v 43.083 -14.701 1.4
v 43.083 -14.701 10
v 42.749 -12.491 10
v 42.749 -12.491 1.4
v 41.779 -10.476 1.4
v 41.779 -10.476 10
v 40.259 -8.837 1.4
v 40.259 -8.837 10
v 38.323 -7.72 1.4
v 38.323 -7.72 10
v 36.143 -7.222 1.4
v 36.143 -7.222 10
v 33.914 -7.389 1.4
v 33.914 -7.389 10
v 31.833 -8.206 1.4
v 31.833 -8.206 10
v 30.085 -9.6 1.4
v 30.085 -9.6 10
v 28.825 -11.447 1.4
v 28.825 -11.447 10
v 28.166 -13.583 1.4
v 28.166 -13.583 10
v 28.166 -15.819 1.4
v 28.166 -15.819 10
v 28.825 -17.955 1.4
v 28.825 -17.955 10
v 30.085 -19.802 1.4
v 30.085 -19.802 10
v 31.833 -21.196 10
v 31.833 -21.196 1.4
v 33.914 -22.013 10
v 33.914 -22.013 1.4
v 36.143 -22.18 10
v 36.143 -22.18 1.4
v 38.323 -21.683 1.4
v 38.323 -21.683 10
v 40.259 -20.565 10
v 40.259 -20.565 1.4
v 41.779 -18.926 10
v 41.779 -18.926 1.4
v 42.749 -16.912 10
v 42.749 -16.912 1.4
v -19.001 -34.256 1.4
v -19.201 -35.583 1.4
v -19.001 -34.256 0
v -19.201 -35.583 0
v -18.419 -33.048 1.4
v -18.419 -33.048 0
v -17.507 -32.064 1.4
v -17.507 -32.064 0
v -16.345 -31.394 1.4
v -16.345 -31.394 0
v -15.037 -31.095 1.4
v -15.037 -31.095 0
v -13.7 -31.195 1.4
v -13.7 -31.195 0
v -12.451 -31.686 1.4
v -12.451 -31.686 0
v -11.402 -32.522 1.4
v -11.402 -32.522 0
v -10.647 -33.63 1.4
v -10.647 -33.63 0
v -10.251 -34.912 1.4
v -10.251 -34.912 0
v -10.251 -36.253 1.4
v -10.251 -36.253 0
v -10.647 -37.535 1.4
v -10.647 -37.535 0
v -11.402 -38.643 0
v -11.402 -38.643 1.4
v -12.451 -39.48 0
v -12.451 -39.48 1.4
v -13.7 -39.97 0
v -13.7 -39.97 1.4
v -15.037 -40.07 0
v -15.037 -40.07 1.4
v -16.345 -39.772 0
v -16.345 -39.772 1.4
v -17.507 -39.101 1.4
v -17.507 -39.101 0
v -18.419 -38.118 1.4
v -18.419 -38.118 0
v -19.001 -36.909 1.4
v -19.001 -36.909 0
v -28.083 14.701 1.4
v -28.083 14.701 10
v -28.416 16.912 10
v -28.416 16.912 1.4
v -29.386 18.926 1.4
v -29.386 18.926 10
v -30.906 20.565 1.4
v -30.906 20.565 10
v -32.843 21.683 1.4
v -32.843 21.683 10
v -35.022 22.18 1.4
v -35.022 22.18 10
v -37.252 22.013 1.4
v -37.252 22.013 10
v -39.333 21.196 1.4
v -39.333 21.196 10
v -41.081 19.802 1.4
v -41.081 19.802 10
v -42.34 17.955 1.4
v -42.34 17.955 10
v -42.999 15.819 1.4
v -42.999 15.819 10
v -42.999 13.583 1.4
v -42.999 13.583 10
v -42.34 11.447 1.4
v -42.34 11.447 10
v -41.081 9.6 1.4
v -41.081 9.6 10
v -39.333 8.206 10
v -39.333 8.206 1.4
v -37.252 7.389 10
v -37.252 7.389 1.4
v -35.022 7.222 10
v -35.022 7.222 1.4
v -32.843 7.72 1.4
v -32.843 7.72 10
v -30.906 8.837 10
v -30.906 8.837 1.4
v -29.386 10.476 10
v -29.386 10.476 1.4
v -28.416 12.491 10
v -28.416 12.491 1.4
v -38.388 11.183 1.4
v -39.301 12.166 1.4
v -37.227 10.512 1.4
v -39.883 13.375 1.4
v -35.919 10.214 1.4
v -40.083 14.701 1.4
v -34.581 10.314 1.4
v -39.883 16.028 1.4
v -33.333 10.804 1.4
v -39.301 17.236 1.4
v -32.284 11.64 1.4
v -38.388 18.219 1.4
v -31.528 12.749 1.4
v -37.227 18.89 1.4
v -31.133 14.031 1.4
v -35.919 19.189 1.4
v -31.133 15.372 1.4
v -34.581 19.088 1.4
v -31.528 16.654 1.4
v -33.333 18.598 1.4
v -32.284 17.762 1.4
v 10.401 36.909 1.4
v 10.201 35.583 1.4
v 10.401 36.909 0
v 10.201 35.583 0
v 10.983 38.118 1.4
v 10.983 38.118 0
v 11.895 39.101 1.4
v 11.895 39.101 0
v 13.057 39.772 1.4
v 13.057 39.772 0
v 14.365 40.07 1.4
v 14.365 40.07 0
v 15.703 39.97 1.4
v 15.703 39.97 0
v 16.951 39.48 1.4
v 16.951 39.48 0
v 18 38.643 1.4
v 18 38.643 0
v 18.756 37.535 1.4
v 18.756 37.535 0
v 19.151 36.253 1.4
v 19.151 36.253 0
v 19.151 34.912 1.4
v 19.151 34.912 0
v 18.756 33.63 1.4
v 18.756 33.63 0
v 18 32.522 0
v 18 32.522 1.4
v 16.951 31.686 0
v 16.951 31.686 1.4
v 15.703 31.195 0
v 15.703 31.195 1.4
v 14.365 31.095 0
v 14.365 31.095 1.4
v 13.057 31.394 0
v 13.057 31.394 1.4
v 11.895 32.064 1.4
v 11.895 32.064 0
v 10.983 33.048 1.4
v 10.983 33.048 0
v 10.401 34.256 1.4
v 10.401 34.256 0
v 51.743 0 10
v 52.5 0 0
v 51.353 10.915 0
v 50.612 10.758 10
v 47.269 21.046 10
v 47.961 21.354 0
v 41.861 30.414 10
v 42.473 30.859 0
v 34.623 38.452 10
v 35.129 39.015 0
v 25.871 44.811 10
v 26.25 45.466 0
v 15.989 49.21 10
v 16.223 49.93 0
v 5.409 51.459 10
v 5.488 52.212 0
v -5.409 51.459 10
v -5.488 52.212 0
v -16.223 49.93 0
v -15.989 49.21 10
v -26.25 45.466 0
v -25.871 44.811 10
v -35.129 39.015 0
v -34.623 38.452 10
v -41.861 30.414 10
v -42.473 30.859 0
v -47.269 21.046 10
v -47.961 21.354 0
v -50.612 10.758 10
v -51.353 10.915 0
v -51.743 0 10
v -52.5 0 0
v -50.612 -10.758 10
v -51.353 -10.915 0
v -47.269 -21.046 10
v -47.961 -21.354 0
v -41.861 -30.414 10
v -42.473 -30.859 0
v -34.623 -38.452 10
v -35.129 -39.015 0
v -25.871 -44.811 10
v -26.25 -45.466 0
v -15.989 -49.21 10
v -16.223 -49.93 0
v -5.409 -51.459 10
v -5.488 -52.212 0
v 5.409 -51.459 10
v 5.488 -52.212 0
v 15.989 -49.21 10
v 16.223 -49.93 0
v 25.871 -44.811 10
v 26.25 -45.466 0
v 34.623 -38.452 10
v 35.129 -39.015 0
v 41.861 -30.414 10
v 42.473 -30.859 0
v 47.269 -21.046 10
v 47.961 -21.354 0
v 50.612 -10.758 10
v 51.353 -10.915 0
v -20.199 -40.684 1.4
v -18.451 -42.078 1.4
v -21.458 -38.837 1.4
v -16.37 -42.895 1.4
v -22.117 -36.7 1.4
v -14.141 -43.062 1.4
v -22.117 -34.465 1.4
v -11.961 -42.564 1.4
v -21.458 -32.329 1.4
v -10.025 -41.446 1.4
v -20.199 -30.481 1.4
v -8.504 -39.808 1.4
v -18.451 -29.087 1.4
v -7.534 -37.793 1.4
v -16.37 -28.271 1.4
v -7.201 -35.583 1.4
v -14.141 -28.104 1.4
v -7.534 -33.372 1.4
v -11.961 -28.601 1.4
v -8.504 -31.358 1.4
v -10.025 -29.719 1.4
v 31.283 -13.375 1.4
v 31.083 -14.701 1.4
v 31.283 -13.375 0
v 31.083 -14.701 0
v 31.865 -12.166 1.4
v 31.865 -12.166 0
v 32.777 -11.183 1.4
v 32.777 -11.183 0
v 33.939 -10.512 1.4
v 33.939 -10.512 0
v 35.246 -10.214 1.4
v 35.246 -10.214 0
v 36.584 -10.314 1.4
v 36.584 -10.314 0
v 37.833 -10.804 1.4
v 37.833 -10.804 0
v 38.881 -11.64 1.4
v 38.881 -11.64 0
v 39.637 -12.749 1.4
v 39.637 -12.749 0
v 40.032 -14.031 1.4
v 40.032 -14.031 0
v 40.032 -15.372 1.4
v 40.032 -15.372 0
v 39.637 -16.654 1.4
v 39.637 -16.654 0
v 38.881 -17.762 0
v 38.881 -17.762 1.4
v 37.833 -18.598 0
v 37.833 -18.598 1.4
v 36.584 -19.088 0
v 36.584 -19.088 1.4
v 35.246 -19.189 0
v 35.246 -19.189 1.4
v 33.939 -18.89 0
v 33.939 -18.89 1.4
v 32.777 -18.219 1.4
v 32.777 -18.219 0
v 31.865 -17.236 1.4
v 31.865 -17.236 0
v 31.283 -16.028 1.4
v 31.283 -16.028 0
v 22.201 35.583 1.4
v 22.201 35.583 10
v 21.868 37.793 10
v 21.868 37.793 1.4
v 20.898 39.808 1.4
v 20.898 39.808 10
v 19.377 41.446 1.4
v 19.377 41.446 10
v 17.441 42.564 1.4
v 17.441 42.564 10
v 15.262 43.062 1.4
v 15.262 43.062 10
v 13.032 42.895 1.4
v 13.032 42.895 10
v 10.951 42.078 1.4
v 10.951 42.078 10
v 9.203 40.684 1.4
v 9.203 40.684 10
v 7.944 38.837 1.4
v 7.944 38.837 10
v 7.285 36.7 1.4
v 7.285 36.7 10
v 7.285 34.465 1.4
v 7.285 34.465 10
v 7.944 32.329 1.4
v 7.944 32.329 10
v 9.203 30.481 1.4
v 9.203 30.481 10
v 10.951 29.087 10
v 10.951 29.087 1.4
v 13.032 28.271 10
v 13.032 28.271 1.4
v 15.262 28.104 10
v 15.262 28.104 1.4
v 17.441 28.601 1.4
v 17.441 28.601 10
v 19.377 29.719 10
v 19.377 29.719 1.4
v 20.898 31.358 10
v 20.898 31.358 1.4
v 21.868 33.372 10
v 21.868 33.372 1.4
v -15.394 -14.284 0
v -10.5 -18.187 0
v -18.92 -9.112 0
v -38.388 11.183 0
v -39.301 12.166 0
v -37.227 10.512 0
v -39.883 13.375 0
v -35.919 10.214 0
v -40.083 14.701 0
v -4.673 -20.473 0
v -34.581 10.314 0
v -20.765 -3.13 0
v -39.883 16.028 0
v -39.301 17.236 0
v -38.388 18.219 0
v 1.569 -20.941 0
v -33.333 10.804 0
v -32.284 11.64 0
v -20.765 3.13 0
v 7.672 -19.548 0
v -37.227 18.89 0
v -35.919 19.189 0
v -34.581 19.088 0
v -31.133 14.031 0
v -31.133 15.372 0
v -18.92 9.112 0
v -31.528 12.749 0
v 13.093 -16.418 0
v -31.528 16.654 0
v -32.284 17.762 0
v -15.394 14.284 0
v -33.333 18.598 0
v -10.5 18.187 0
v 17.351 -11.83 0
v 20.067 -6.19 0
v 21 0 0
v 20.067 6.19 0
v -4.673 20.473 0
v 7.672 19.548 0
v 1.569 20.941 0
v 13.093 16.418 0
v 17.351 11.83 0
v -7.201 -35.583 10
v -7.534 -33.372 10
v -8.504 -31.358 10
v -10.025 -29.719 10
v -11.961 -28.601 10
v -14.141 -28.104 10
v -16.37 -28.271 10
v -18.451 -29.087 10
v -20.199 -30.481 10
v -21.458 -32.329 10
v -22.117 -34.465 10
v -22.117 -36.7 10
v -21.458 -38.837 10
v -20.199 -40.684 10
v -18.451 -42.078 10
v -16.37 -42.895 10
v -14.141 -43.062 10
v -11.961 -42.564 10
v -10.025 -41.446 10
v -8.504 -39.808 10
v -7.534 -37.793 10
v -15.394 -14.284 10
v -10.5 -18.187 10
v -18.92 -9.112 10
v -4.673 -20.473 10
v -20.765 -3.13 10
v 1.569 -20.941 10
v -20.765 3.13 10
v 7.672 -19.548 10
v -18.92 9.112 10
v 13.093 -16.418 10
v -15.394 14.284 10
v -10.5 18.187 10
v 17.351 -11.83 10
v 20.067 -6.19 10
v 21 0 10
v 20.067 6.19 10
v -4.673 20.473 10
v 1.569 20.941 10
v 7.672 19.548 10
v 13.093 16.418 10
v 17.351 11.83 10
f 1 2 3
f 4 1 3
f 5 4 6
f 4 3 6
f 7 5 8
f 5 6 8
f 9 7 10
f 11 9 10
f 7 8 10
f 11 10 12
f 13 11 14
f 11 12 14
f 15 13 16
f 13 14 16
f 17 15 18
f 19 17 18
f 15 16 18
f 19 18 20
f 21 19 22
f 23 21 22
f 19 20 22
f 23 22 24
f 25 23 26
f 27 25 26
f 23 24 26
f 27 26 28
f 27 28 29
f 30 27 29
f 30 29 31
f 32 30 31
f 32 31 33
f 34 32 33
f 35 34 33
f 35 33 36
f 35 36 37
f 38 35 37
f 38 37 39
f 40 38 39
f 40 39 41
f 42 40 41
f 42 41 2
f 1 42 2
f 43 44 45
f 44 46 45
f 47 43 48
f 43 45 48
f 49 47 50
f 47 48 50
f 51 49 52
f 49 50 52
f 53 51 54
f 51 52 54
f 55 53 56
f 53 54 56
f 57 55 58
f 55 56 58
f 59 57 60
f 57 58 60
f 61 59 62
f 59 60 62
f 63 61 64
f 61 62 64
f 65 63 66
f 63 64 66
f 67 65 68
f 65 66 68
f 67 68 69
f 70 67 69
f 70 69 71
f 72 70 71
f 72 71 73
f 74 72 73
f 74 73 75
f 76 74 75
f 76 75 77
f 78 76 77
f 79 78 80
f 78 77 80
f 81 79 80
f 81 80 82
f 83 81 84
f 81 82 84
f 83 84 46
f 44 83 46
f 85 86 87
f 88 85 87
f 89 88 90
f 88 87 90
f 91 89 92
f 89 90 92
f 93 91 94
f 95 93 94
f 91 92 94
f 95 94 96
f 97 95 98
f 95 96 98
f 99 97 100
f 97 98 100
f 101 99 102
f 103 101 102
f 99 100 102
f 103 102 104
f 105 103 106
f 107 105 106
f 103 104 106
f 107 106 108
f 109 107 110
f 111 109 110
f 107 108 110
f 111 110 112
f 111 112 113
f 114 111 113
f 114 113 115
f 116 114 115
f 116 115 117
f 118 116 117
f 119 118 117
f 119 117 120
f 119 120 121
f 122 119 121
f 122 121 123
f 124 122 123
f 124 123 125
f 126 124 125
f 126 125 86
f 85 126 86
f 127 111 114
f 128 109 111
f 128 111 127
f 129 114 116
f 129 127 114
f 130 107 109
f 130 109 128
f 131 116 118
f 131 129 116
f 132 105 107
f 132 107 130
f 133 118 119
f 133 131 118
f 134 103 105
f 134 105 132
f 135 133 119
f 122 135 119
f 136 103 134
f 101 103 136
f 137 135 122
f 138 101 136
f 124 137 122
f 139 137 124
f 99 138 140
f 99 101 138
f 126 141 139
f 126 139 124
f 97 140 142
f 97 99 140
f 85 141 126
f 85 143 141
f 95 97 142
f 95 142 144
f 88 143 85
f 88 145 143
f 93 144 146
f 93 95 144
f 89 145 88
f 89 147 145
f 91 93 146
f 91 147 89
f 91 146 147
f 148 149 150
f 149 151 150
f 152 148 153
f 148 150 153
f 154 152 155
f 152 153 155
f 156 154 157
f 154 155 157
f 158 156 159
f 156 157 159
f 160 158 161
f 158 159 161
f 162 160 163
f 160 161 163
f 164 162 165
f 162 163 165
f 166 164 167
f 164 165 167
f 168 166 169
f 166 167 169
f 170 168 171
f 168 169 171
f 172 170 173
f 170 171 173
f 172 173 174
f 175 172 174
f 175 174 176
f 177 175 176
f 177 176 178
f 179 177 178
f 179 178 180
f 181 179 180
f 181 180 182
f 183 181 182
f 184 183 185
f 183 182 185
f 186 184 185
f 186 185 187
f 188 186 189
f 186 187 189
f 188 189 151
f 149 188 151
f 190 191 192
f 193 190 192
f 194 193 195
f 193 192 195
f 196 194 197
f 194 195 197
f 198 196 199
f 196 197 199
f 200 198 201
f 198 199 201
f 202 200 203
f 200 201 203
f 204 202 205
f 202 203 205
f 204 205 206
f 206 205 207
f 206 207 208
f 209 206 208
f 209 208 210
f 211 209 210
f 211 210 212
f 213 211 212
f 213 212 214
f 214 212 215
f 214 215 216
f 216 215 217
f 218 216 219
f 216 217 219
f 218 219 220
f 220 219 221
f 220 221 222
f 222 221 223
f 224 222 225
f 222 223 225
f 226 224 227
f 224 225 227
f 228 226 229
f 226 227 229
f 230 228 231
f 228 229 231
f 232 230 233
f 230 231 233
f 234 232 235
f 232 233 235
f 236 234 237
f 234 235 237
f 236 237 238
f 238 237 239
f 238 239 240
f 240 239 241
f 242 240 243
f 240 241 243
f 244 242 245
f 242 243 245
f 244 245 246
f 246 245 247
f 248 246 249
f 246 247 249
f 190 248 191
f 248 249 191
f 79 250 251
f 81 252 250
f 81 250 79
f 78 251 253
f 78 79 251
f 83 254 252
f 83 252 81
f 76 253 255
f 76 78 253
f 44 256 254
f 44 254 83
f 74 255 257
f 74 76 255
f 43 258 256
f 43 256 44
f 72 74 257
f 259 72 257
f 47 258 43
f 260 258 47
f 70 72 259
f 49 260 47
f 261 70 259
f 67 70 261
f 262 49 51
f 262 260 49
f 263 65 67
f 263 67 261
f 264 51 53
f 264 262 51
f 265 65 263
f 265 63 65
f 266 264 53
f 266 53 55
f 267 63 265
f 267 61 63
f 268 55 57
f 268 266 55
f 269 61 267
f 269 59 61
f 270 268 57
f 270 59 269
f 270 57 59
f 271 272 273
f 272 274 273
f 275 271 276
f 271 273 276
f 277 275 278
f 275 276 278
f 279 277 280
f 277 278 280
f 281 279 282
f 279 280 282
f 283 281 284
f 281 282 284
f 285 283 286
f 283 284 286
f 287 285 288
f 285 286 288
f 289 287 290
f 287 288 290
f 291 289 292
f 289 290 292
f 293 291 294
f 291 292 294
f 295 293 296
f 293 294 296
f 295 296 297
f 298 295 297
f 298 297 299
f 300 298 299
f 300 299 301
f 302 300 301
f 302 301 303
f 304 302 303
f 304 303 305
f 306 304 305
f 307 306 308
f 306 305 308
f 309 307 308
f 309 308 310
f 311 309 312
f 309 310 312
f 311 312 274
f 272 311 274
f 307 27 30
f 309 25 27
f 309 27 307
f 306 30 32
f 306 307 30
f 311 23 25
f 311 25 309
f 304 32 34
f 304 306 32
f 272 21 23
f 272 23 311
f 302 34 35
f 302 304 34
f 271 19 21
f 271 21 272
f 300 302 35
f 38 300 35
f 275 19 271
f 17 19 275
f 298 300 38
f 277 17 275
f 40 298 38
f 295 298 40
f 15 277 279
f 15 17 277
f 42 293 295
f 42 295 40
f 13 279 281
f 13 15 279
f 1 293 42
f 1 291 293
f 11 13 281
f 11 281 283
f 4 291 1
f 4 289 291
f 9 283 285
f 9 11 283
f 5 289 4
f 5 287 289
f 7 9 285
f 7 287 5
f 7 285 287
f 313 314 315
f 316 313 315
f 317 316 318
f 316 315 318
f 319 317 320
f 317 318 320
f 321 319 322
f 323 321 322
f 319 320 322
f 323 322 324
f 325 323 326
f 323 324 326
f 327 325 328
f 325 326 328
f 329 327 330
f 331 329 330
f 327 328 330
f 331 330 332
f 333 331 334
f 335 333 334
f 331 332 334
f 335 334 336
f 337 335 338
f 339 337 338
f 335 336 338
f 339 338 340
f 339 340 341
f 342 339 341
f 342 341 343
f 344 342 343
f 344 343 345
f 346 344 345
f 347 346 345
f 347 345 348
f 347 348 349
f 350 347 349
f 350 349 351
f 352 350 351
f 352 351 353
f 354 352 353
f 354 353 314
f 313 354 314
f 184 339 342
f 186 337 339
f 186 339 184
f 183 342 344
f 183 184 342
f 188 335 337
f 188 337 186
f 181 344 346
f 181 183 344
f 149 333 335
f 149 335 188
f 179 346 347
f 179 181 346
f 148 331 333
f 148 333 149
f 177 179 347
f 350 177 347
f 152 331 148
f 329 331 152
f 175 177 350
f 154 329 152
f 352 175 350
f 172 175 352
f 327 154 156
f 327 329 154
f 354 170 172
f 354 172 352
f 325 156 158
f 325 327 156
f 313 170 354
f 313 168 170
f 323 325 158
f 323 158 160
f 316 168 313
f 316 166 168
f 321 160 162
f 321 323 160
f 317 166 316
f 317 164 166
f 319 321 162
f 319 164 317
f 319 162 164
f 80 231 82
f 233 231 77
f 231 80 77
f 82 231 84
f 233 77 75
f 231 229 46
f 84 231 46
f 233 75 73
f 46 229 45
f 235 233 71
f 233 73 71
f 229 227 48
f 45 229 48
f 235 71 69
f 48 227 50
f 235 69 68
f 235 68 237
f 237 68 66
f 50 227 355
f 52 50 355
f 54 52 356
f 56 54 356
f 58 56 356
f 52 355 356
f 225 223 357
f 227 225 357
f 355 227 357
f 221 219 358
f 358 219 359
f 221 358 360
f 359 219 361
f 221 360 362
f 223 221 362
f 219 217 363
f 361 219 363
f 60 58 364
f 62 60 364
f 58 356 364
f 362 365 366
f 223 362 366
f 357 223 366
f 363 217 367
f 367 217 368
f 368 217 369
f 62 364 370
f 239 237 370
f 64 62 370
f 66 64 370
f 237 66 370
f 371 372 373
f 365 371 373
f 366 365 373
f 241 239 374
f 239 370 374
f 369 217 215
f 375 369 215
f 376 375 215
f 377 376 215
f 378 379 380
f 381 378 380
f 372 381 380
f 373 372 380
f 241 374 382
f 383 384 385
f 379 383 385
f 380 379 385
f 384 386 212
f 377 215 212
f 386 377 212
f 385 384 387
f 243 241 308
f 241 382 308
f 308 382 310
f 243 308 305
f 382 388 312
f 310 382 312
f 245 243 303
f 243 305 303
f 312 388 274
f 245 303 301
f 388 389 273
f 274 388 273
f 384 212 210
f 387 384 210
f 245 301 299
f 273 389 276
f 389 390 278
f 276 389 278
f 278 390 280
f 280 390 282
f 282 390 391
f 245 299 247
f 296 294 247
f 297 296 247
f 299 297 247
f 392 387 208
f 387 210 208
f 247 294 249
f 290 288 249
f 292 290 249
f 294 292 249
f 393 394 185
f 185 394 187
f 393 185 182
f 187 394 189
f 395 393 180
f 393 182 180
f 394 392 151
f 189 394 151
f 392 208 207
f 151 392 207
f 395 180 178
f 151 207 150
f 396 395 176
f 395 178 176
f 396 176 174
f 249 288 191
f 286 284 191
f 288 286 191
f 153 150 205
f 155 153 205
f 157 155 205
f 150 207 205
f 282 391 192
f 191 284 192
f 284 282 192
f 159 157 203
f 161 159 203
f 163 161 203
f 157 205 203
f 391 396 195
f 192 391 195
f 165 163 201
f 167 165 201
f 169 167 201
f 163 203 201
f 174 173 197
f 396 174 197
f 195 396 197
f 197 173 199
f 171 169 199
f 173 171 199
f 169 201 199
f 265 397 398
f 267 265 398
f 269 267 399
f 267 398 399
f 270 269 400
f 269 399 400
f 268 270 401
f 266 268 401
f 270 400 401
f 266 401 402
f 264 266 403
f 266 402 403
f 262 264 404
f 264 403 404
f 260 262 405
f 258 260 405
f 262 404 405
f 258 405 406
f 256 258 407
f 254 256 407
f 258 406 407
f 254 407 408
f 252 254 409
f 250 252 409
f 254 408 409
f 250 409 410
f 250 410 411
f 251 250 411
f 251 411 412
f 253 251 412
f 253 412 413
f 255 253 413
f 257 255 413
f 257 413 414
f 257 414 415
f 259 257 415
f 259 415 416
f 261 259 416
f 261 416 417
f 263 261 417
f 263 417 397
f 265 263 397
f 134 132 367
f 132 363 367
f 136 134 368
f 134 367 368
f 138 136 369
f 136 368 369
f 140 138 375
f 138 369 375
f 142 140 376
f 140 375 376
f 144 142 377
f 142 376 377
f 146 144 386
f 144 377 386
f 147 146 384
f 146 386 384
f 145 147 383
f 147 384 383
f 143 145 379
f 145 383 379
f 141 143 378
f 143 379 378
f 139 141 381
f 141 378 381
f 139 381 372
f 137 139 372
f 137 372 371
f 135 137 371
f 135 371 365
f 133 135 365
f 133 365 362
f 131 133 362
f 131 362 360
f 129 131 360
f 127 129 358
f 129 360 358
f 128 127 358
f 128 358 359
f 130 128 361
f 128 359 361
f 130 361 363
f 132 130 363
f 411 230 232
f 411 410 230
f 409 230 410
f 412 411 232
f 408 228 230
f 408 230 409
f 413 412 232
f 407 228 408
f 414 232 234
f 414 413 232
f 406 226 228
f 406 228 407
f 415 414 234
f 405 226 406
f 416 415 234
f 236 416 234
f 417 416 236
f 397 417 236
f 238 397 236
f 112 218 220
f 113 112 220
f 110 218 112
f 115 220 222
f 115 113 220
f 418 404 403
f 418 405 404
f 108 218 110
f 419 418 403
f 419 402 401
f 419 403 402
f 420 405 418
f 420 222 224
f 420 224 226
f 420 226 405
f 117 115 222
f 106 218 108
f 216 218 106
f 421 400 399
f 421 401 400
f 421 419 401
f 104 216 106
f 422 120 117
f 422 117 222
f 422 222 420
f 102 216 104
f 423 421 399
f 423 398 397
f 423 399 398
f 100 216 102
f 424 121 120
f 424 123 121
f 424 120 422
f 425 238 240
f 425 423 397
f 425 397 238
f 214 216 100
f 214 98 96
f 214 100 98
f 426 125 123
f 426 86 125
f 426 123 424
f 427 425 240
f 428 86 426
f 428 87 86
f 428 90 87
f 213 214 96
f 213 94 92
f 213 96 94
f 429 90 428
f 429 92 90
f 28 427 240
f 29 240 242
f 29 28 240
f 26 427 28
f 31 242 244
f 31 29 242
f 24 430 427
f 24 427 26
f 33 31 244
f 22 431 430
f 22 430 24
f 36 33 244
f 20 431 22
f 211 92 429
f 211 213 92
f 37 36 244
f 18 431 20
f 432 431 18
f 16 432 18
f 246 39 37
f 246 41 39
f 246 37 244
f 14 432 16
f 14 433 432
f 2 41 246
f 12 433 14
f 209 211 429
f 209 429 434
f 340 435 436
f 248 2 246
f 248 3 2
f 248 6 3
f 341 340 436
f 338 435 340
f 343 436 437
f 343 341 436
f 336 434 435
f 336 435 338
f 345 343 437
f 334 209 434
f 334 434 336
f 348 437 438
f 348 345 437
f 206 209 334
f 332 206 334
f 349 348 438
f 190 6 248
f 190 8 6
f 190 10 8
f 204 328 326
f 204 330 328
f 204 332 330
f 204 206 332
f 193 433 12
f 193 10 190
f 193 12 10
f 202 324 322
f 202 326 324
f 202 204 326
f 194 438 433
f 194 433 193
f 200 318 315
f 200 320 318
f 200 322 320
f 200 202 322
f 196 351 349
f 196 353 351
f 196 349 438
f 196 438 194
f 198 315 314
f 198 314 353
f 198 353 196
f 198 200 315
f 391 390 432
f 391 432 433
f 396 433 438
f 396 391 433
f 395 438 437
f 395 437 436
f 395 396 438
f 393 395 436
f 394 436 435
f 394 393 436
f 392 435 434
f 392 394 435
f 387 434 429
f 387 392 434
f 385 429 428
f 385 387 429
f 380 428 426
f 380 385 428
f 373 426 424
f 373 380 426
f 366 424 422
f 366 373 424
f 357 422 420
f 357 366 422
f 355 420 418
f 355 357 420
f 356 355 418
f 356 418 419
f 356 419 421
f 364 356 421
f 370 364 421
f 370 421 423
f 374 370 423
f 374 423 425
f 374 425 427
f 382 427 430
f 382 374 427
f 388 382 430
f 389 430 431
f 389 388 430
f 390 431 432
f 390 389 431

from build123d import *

# Parameters (mm, degrees)
IZIM1_R                                           = 52.5
IZIM1_R_2                                         = 21
Y_KSEKLIK_EKSTR_ZYON1_DEPTH                       = 10
Y_KSEKLIK_EKSTR_ZYON1_DRAFT                       = 4.33
M8_ALT_GEN_ALYAN_BA_L_K_R_VIDA_IN_HAV_D           = 9
M8_ALT_GEN_ALYAN_BA_L_K_R_VIDA_IN_HAV_DEPTH       = 22.25
M8_ALT_GEN_ALYAN_BA_L_K_R_VIDA_IN_HAV_CBORE_D     = 15
M8_ALT_GEN_ALYAN_BA_L_K_R_VIDA_IN_HAV_CBORE_DEPTH = 8.6
M8_ALT_GEN_ALYAN_BA_L_K_R_VIDA_IN_HAV_TIP         = 2.703872786
IZIM4_R                                           = 22
IZIM4_R_2                                         = 21
Y_KSEKLIK_EKSTR_ZYON2_DEPTH                       = 10


with BuildPart() as part:
    # Çizim1 → Yükseklik-Ekstrüzyon1 (with draft: the straight prism first)
    with BuildSketch(Plane.XY):
        Circle(IZIM1_R)
        Circle(IZIM1_R_2, mode=Mode.SUBTRACT)
    extrude(amount=Y_KSEKLIK_EKSTR_ZYON1_DEPTH)
    # Yükseklik-Ekstrüzyon1: the draft: its side faces are tilted about the plane it starts from
    y_kseklik_ekstr_zyon1_sides = [part.faces().sort_by_distance(p)[0] for p in [
        (-52.5, 0, 5),
        (-21, 0, 5),
    ]]
    draft(y_kseklik_ekstr_zyon1_sides, Plane.XY, Y_KSEKLIK_EKSTR_ZYON1_DRAFT)

    # M8 Altıgen Alyan Başlı Kör Vida İçin Havşa1
    with Locations(Plane.XY.offset(10)):
        with Locations((14.701198769, 35.58264682), (-35.58264682, 14.701198769), (-14.701198769, -35.58264682), (35.58264682, -14.701198769)):
            CounterBoreHole(M8_ALT_GEN_ALYAN_BA_L_K_R_VIDA_IN_HAV_D / 2, M8_ALT_GEN_ALYAN_BA_L_K_R_VIDA_IN_HAV_CBORE_D / 2, M8_ALT_GEN_ALYAN_BA_L_K_R_VIDA_IN_HAV_CBORE_DEPTH, depth=M8_ALT_GEN_ALYAN_BA_L_K_R_VIDA_IN_HAV_DEPTH)
            with Locations((0, 0, -(M8_ALT_GEN_ALYAN_BA_L_K_R_VIDA_IN_HAV_DEPTH + M8_ALT_GEN_ALYAN_BA_L_K_R_VIDA_IN_HAV_TIP / 2))):  # 118° drill point
                Cone(0, M8_ALT_GEN_ALYAN_BA_L_K_R_VIDA_IN_HAV_D / 2, M8_ALT_GEN_ALYAN_BA_L_K_R_VIDA_IN_HAV_TIP, mode=Mode.SUBTRACT)

    # Çizim4 → Yükseklik-Ekstrüzyon2 (add)
    with BuildSketch(Plane.XY):
        Circle(IZIM4_R)
        Circle(IZIM4_R_2, mode=Mode.SUBTRACT)
    extrude(amount=Y_KSEKLIK_EKSTR_ZYON2_DEPTH)


solid = part.part
